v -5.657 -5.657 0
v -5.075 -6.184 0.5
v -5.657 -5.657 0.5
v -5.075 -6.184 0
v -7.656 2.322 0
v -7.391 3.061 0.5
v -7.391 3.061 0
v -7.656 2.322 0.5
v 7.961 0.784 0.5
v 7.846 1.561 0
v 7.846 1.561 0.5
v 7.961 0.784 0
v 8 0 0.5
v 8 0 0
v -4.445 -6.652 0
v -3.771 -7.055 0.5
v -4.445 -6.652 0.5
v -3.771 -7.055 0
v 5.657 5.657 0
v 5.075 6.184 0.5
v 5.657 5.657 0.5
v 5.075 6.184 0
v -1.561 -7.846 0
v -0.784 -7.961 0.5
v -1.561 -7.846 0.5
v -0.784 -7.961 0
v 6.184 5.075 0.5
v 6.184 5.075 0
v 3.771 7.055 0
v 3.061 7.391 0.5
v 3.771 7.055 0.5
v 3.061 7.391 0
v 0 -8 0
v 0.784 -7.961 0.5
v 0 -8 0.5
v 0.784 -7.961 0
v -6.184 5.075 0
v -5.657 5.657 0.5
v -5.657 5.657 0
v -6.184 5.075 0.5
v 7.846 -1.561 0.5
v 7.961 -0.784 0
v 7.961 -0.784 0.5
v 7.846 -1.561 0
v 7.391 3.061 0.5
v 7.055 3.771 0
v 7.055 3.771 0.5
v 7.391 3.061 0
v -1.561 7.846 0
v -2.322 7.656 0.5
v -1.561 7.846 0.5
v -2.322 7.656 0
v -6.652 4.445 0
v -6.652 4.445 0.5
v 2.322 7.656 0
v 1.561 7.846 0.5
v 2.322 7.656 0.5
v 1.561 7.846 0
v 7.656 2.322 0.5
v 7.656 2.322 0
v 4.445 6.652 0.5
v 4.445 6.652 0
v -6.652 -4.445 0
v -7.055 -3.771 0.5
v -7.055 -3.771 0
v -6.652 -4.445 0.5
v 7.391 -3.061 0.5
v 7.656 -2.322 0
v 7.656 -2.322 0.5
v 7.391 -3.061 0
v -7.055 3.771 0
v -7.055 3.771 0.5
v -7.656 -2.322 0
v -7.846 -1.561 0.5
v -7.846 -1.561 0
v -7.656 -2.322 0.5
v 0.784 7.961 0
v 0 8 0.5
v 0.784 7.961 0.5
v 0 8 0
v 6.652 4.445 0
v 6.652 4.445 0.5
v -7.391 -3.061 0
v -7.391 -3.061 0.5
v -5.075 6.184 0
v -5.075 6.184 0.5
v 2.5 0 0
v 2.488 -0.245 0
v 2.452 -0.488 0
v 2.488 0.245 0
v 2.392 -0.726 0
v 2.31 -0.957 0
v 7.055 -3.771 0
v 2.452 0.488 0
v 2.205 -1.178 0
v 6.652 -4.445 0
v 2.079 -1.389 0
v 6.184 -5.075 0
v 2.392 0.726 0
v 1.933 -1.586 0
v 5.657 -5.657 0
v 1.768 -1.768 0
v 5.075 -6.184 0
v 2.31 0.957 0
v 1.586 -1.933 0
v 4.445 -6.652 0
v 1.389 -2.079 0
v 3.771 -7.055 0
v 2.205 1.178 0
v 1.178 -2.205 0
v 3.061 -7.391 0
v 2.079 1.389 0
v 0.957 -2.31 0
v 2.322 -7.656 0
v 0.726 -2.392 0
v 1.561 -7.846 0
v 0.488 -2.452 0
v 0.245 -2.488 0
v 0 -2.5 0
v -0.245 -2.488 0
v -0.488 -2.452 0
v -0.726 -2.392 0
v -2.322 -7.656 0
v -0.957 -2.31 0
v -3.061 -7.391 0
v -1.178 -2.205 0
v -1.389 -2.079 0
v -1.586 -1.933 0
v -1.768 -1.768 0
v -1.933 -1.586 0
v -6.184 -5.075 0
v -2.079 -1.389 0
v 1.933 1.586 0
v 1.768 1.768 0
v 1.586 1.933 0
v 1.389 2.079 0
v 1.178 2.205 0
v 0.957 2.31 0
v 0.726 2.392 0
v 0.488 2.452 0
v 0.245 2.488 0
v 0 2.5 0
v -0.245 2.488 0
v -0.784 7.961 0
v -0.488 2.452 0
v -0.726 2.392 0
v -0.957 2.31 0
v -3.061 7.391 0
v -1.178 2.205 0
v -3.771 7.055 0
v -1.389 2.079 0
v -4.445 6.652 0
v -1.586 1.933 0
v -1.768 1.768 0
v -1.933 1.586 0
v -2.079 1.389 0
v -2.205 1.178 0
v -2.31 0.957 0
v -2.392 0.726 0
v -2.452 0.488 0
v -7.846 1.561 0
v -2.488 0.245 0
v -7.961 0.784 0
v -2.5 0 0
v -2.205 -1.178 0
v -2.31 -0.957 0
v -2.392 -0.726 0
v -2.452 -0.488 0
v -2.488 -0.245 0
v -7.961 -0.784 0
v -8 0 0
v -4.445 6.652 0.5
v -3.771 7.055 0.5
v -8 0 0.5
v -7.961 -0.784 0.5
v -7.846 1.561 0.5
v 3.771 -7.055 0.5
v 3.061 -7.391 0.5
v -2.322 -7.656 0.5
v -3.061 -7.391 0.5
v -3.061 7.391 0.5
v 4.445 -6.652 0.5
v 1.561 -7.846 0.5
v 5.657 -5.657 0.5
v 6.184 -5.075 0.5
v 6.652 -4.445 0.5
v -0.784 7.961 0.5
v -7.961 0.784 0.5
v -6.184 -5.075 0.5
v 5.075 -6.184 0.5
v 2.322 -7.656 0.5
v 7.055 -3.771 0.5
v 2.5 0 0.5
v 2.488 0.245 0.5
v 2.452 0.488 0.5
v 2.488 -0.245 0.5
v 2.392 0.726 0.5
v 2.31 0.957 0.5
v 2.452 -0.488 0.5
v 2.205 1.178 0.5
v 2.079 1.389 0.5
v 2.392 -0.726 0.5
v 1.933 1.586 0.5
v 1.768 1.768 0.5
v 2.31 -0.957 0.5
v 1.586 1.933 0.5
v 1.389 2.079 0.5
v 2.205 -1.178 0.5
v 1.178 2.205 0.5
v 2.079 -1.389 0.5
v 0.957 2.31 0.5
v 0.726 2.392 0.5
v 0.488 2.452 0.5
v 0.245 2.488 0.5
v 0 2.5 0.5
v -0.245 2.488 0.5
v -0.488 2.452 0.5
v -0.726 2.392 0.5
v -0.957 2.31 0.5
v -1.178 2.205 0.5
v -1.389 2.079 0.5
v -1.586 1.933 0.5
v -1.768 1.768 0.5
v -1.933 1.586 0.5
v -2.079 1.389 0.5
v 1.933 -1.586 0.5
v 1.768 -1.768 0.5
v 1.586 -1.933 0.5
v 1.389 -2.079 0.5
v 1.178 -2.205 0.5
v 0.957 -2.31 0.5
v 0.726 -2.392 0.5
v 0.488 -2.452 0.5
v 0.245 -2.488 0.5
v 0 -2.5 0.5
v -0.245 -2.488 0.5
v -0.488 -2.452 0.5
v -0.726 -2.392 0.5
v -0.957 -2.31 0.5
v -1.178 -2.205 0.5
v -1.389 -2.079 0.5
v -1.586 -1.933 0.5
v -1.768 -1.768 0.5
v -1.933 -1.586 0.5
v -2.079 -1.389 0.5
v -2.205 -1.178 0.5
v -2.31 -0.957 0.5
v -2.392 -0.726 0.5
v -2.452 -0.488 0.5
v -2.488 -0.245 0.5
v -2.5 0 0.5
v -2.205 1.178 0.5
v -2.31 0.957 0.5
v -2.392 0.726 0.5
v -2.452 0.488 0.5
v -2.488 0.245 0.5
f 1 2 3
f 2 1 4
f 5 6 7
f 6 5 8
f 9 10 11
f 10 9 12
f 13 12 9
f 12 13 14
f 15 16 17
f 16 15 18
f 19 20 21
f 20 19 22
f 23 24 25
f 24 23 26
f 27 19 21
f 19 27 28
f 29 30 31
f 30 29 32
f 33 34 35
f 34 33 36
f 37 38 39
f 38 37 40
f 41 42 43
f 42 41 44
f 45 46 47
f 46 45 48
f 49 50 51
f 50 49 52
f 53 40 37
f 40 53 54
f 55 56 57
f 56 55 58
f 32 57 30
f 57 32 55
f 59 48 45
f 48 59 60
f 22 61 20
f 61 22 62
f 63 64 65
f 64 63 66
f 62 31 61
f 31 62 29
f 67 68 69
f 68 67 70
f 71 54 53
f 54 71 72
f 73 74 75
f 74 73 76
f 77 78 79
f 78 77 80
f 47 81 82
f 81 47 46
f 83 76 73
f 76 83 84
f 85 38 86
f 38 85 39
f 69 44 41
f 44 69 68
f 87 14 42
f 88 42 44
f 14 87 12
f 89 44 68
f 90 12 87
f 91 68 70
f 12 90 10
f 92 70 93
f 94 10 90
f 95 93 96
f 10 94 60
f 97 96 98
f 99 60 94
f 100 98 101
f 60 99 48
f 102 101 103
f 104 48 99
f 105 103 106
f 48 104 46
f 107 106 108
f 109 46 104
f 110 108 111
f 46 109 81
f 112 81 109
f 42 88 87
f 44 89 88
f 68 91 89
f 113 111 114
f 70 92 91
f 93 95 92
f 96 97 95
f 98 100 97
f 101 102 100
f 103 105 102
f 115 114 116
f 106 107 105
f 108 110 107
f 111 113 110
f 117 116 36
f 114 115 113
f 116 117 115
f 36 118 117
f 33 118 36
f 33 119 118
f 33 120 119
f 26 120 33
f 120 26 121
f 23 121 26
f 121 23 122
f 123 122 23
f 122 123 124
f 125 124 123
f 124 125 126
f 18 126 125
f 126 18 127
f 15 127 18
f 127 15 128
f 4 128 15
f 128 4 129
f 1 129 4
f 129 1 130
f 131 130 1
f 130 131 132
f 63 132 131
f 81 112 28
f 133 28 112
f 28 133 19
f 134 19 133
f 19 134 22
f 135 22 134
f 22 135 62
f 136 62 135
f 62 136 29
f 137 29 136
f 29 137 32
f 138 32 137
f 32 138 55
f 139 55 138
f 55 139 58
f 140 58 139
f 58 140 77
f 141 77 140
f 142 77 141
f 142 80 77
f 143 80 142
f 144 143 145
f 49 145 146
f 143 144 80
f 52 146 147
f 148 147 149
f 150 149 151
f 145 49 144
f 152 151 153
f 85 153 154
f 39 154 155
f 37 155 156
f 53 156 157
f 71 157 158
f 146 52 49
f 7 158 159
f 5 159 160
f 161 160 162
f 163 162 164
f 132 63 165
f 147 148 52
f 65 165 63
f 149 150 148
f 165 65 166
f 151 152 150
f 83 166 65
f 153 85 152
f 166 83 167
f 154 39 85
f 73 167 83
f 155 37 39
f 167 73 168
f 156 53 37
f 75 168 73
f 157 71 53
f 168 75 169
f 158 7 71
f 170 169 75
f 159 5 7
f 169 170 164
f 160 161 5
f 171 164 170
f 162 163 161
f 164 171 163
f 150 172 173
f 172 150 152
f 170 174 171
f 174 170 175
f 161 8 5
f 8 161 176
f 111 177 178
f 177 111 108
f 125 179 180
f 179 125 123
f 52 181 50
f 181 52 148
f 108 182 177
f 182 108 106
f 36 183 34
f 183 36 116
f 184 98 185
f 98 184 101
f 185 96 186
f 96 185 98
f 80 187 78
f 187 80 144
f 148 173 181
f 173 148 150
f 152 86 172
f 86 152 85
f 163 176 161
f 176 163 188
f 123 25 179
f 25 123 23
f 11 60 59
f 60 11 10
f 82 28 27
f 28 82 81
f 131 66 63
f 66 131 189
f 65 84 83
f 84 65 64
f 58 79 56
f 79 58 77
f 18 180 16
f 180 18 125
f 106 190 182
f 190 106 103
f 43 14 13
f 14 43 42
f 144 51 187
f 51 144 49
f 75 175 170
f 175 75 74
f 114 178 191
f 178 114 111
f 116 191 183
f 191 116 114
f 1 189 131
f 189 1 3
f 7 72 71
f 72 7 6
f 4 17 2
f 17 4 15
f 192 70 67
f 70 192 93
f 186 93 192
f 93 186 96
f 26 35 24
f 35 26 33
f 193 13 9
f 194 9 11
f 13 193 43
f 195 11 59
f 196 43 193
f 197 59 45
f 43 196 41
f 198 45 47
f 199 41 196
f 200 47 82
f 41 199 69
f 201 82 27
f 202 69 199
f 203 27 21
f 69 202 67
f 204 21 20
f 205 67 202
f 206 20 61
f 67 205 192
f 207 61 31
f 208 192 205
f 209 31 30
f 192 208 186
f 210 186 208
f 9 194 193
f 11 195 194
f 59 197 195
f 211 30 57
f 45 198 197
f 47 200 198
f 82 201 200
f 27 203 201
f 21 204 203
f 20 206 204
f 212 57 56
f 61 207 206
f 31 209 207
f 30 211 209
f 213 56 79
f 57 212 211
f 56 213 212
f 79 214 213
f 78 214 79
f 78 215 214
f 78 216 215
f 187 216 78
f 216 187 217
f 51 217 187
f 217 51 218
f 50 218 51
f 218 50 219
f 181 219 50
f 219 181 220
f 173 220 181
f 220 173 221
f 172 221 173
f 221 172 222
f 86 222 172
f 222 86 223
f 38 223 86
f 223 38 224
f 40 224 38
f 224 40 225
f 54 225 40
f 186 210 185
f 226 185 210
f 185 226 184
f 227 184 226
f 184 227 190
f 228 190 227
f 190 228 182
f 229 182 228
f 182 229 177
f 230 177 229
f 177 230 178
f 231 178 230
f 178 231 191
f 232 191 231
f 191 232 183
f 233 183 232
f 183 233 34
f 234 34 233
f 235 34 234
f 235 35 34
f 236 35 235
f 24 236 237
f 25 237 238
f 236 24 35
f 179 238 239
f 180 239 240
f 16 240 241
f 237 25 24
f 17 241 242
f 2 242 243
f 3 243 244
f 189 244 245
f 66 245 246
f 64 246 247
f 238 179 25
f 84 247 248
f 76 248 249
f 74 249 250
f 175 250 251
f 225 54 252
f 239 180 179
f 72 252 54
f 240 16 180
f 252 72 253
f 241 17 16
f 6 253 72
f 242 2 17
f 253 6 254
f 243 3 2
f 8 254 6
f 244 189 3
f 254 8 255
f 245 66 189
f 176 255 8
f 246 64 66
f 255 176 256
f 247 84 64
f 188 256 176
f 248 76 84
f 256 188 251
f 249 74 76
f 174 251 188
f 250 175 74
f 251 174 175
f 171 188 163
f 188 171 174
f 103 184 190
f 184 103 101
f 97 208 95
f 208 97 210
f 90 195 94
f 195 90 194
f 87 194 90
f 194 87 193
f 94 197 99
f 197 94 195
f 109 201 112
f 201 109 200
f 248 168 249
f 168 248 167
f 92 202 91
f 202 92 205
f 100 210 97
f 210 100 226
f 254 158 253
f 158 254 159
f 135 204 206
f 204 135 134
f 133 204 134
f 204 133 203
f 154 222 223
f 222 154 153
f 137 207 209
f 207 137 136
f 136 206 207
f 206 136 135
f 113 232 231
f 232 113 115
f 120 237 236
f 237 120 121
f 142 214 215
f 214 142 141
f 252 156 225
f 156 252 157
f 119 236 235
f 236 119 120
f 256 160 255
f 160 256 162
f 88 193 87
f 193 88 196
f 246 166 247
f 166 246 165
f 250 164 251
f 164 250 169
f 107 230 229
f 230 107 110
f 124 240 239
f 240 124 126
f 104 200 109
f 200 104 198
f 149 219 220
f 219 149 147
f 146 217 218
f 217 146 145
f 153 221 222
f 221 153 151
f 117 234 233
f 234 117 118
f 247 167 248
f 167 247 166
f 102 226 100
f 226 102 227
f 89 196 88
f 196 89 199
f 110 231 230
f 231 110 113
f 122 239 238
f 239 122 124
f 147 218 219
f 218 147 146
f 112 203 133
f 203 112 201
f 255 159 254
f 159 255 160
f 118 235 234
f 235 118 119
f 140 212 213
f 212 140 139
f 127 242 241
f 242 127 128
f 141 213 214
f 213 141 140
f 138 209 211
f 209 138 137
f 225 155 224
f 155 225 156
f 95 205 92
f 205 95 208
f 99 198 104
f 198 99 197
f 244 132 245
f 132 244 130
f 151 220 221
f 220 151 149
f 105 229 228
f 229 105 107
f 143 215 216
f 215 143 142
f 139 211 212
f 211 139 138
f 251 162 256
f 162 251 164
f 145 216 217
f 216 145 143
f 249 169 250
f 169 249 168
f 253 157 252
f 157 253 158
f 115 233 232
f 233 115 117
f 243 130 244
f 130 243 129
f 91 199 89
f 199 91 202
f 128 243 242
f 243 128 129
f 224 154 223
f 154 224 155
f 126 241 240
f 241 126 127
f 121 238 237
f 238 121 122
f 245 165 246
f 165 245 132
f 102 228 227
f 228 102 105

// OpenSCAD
difference() {
    cylinder(d=16, h=0.5, $fn=64);
    cylinder(d=5, h=1, $fn=64);
}
